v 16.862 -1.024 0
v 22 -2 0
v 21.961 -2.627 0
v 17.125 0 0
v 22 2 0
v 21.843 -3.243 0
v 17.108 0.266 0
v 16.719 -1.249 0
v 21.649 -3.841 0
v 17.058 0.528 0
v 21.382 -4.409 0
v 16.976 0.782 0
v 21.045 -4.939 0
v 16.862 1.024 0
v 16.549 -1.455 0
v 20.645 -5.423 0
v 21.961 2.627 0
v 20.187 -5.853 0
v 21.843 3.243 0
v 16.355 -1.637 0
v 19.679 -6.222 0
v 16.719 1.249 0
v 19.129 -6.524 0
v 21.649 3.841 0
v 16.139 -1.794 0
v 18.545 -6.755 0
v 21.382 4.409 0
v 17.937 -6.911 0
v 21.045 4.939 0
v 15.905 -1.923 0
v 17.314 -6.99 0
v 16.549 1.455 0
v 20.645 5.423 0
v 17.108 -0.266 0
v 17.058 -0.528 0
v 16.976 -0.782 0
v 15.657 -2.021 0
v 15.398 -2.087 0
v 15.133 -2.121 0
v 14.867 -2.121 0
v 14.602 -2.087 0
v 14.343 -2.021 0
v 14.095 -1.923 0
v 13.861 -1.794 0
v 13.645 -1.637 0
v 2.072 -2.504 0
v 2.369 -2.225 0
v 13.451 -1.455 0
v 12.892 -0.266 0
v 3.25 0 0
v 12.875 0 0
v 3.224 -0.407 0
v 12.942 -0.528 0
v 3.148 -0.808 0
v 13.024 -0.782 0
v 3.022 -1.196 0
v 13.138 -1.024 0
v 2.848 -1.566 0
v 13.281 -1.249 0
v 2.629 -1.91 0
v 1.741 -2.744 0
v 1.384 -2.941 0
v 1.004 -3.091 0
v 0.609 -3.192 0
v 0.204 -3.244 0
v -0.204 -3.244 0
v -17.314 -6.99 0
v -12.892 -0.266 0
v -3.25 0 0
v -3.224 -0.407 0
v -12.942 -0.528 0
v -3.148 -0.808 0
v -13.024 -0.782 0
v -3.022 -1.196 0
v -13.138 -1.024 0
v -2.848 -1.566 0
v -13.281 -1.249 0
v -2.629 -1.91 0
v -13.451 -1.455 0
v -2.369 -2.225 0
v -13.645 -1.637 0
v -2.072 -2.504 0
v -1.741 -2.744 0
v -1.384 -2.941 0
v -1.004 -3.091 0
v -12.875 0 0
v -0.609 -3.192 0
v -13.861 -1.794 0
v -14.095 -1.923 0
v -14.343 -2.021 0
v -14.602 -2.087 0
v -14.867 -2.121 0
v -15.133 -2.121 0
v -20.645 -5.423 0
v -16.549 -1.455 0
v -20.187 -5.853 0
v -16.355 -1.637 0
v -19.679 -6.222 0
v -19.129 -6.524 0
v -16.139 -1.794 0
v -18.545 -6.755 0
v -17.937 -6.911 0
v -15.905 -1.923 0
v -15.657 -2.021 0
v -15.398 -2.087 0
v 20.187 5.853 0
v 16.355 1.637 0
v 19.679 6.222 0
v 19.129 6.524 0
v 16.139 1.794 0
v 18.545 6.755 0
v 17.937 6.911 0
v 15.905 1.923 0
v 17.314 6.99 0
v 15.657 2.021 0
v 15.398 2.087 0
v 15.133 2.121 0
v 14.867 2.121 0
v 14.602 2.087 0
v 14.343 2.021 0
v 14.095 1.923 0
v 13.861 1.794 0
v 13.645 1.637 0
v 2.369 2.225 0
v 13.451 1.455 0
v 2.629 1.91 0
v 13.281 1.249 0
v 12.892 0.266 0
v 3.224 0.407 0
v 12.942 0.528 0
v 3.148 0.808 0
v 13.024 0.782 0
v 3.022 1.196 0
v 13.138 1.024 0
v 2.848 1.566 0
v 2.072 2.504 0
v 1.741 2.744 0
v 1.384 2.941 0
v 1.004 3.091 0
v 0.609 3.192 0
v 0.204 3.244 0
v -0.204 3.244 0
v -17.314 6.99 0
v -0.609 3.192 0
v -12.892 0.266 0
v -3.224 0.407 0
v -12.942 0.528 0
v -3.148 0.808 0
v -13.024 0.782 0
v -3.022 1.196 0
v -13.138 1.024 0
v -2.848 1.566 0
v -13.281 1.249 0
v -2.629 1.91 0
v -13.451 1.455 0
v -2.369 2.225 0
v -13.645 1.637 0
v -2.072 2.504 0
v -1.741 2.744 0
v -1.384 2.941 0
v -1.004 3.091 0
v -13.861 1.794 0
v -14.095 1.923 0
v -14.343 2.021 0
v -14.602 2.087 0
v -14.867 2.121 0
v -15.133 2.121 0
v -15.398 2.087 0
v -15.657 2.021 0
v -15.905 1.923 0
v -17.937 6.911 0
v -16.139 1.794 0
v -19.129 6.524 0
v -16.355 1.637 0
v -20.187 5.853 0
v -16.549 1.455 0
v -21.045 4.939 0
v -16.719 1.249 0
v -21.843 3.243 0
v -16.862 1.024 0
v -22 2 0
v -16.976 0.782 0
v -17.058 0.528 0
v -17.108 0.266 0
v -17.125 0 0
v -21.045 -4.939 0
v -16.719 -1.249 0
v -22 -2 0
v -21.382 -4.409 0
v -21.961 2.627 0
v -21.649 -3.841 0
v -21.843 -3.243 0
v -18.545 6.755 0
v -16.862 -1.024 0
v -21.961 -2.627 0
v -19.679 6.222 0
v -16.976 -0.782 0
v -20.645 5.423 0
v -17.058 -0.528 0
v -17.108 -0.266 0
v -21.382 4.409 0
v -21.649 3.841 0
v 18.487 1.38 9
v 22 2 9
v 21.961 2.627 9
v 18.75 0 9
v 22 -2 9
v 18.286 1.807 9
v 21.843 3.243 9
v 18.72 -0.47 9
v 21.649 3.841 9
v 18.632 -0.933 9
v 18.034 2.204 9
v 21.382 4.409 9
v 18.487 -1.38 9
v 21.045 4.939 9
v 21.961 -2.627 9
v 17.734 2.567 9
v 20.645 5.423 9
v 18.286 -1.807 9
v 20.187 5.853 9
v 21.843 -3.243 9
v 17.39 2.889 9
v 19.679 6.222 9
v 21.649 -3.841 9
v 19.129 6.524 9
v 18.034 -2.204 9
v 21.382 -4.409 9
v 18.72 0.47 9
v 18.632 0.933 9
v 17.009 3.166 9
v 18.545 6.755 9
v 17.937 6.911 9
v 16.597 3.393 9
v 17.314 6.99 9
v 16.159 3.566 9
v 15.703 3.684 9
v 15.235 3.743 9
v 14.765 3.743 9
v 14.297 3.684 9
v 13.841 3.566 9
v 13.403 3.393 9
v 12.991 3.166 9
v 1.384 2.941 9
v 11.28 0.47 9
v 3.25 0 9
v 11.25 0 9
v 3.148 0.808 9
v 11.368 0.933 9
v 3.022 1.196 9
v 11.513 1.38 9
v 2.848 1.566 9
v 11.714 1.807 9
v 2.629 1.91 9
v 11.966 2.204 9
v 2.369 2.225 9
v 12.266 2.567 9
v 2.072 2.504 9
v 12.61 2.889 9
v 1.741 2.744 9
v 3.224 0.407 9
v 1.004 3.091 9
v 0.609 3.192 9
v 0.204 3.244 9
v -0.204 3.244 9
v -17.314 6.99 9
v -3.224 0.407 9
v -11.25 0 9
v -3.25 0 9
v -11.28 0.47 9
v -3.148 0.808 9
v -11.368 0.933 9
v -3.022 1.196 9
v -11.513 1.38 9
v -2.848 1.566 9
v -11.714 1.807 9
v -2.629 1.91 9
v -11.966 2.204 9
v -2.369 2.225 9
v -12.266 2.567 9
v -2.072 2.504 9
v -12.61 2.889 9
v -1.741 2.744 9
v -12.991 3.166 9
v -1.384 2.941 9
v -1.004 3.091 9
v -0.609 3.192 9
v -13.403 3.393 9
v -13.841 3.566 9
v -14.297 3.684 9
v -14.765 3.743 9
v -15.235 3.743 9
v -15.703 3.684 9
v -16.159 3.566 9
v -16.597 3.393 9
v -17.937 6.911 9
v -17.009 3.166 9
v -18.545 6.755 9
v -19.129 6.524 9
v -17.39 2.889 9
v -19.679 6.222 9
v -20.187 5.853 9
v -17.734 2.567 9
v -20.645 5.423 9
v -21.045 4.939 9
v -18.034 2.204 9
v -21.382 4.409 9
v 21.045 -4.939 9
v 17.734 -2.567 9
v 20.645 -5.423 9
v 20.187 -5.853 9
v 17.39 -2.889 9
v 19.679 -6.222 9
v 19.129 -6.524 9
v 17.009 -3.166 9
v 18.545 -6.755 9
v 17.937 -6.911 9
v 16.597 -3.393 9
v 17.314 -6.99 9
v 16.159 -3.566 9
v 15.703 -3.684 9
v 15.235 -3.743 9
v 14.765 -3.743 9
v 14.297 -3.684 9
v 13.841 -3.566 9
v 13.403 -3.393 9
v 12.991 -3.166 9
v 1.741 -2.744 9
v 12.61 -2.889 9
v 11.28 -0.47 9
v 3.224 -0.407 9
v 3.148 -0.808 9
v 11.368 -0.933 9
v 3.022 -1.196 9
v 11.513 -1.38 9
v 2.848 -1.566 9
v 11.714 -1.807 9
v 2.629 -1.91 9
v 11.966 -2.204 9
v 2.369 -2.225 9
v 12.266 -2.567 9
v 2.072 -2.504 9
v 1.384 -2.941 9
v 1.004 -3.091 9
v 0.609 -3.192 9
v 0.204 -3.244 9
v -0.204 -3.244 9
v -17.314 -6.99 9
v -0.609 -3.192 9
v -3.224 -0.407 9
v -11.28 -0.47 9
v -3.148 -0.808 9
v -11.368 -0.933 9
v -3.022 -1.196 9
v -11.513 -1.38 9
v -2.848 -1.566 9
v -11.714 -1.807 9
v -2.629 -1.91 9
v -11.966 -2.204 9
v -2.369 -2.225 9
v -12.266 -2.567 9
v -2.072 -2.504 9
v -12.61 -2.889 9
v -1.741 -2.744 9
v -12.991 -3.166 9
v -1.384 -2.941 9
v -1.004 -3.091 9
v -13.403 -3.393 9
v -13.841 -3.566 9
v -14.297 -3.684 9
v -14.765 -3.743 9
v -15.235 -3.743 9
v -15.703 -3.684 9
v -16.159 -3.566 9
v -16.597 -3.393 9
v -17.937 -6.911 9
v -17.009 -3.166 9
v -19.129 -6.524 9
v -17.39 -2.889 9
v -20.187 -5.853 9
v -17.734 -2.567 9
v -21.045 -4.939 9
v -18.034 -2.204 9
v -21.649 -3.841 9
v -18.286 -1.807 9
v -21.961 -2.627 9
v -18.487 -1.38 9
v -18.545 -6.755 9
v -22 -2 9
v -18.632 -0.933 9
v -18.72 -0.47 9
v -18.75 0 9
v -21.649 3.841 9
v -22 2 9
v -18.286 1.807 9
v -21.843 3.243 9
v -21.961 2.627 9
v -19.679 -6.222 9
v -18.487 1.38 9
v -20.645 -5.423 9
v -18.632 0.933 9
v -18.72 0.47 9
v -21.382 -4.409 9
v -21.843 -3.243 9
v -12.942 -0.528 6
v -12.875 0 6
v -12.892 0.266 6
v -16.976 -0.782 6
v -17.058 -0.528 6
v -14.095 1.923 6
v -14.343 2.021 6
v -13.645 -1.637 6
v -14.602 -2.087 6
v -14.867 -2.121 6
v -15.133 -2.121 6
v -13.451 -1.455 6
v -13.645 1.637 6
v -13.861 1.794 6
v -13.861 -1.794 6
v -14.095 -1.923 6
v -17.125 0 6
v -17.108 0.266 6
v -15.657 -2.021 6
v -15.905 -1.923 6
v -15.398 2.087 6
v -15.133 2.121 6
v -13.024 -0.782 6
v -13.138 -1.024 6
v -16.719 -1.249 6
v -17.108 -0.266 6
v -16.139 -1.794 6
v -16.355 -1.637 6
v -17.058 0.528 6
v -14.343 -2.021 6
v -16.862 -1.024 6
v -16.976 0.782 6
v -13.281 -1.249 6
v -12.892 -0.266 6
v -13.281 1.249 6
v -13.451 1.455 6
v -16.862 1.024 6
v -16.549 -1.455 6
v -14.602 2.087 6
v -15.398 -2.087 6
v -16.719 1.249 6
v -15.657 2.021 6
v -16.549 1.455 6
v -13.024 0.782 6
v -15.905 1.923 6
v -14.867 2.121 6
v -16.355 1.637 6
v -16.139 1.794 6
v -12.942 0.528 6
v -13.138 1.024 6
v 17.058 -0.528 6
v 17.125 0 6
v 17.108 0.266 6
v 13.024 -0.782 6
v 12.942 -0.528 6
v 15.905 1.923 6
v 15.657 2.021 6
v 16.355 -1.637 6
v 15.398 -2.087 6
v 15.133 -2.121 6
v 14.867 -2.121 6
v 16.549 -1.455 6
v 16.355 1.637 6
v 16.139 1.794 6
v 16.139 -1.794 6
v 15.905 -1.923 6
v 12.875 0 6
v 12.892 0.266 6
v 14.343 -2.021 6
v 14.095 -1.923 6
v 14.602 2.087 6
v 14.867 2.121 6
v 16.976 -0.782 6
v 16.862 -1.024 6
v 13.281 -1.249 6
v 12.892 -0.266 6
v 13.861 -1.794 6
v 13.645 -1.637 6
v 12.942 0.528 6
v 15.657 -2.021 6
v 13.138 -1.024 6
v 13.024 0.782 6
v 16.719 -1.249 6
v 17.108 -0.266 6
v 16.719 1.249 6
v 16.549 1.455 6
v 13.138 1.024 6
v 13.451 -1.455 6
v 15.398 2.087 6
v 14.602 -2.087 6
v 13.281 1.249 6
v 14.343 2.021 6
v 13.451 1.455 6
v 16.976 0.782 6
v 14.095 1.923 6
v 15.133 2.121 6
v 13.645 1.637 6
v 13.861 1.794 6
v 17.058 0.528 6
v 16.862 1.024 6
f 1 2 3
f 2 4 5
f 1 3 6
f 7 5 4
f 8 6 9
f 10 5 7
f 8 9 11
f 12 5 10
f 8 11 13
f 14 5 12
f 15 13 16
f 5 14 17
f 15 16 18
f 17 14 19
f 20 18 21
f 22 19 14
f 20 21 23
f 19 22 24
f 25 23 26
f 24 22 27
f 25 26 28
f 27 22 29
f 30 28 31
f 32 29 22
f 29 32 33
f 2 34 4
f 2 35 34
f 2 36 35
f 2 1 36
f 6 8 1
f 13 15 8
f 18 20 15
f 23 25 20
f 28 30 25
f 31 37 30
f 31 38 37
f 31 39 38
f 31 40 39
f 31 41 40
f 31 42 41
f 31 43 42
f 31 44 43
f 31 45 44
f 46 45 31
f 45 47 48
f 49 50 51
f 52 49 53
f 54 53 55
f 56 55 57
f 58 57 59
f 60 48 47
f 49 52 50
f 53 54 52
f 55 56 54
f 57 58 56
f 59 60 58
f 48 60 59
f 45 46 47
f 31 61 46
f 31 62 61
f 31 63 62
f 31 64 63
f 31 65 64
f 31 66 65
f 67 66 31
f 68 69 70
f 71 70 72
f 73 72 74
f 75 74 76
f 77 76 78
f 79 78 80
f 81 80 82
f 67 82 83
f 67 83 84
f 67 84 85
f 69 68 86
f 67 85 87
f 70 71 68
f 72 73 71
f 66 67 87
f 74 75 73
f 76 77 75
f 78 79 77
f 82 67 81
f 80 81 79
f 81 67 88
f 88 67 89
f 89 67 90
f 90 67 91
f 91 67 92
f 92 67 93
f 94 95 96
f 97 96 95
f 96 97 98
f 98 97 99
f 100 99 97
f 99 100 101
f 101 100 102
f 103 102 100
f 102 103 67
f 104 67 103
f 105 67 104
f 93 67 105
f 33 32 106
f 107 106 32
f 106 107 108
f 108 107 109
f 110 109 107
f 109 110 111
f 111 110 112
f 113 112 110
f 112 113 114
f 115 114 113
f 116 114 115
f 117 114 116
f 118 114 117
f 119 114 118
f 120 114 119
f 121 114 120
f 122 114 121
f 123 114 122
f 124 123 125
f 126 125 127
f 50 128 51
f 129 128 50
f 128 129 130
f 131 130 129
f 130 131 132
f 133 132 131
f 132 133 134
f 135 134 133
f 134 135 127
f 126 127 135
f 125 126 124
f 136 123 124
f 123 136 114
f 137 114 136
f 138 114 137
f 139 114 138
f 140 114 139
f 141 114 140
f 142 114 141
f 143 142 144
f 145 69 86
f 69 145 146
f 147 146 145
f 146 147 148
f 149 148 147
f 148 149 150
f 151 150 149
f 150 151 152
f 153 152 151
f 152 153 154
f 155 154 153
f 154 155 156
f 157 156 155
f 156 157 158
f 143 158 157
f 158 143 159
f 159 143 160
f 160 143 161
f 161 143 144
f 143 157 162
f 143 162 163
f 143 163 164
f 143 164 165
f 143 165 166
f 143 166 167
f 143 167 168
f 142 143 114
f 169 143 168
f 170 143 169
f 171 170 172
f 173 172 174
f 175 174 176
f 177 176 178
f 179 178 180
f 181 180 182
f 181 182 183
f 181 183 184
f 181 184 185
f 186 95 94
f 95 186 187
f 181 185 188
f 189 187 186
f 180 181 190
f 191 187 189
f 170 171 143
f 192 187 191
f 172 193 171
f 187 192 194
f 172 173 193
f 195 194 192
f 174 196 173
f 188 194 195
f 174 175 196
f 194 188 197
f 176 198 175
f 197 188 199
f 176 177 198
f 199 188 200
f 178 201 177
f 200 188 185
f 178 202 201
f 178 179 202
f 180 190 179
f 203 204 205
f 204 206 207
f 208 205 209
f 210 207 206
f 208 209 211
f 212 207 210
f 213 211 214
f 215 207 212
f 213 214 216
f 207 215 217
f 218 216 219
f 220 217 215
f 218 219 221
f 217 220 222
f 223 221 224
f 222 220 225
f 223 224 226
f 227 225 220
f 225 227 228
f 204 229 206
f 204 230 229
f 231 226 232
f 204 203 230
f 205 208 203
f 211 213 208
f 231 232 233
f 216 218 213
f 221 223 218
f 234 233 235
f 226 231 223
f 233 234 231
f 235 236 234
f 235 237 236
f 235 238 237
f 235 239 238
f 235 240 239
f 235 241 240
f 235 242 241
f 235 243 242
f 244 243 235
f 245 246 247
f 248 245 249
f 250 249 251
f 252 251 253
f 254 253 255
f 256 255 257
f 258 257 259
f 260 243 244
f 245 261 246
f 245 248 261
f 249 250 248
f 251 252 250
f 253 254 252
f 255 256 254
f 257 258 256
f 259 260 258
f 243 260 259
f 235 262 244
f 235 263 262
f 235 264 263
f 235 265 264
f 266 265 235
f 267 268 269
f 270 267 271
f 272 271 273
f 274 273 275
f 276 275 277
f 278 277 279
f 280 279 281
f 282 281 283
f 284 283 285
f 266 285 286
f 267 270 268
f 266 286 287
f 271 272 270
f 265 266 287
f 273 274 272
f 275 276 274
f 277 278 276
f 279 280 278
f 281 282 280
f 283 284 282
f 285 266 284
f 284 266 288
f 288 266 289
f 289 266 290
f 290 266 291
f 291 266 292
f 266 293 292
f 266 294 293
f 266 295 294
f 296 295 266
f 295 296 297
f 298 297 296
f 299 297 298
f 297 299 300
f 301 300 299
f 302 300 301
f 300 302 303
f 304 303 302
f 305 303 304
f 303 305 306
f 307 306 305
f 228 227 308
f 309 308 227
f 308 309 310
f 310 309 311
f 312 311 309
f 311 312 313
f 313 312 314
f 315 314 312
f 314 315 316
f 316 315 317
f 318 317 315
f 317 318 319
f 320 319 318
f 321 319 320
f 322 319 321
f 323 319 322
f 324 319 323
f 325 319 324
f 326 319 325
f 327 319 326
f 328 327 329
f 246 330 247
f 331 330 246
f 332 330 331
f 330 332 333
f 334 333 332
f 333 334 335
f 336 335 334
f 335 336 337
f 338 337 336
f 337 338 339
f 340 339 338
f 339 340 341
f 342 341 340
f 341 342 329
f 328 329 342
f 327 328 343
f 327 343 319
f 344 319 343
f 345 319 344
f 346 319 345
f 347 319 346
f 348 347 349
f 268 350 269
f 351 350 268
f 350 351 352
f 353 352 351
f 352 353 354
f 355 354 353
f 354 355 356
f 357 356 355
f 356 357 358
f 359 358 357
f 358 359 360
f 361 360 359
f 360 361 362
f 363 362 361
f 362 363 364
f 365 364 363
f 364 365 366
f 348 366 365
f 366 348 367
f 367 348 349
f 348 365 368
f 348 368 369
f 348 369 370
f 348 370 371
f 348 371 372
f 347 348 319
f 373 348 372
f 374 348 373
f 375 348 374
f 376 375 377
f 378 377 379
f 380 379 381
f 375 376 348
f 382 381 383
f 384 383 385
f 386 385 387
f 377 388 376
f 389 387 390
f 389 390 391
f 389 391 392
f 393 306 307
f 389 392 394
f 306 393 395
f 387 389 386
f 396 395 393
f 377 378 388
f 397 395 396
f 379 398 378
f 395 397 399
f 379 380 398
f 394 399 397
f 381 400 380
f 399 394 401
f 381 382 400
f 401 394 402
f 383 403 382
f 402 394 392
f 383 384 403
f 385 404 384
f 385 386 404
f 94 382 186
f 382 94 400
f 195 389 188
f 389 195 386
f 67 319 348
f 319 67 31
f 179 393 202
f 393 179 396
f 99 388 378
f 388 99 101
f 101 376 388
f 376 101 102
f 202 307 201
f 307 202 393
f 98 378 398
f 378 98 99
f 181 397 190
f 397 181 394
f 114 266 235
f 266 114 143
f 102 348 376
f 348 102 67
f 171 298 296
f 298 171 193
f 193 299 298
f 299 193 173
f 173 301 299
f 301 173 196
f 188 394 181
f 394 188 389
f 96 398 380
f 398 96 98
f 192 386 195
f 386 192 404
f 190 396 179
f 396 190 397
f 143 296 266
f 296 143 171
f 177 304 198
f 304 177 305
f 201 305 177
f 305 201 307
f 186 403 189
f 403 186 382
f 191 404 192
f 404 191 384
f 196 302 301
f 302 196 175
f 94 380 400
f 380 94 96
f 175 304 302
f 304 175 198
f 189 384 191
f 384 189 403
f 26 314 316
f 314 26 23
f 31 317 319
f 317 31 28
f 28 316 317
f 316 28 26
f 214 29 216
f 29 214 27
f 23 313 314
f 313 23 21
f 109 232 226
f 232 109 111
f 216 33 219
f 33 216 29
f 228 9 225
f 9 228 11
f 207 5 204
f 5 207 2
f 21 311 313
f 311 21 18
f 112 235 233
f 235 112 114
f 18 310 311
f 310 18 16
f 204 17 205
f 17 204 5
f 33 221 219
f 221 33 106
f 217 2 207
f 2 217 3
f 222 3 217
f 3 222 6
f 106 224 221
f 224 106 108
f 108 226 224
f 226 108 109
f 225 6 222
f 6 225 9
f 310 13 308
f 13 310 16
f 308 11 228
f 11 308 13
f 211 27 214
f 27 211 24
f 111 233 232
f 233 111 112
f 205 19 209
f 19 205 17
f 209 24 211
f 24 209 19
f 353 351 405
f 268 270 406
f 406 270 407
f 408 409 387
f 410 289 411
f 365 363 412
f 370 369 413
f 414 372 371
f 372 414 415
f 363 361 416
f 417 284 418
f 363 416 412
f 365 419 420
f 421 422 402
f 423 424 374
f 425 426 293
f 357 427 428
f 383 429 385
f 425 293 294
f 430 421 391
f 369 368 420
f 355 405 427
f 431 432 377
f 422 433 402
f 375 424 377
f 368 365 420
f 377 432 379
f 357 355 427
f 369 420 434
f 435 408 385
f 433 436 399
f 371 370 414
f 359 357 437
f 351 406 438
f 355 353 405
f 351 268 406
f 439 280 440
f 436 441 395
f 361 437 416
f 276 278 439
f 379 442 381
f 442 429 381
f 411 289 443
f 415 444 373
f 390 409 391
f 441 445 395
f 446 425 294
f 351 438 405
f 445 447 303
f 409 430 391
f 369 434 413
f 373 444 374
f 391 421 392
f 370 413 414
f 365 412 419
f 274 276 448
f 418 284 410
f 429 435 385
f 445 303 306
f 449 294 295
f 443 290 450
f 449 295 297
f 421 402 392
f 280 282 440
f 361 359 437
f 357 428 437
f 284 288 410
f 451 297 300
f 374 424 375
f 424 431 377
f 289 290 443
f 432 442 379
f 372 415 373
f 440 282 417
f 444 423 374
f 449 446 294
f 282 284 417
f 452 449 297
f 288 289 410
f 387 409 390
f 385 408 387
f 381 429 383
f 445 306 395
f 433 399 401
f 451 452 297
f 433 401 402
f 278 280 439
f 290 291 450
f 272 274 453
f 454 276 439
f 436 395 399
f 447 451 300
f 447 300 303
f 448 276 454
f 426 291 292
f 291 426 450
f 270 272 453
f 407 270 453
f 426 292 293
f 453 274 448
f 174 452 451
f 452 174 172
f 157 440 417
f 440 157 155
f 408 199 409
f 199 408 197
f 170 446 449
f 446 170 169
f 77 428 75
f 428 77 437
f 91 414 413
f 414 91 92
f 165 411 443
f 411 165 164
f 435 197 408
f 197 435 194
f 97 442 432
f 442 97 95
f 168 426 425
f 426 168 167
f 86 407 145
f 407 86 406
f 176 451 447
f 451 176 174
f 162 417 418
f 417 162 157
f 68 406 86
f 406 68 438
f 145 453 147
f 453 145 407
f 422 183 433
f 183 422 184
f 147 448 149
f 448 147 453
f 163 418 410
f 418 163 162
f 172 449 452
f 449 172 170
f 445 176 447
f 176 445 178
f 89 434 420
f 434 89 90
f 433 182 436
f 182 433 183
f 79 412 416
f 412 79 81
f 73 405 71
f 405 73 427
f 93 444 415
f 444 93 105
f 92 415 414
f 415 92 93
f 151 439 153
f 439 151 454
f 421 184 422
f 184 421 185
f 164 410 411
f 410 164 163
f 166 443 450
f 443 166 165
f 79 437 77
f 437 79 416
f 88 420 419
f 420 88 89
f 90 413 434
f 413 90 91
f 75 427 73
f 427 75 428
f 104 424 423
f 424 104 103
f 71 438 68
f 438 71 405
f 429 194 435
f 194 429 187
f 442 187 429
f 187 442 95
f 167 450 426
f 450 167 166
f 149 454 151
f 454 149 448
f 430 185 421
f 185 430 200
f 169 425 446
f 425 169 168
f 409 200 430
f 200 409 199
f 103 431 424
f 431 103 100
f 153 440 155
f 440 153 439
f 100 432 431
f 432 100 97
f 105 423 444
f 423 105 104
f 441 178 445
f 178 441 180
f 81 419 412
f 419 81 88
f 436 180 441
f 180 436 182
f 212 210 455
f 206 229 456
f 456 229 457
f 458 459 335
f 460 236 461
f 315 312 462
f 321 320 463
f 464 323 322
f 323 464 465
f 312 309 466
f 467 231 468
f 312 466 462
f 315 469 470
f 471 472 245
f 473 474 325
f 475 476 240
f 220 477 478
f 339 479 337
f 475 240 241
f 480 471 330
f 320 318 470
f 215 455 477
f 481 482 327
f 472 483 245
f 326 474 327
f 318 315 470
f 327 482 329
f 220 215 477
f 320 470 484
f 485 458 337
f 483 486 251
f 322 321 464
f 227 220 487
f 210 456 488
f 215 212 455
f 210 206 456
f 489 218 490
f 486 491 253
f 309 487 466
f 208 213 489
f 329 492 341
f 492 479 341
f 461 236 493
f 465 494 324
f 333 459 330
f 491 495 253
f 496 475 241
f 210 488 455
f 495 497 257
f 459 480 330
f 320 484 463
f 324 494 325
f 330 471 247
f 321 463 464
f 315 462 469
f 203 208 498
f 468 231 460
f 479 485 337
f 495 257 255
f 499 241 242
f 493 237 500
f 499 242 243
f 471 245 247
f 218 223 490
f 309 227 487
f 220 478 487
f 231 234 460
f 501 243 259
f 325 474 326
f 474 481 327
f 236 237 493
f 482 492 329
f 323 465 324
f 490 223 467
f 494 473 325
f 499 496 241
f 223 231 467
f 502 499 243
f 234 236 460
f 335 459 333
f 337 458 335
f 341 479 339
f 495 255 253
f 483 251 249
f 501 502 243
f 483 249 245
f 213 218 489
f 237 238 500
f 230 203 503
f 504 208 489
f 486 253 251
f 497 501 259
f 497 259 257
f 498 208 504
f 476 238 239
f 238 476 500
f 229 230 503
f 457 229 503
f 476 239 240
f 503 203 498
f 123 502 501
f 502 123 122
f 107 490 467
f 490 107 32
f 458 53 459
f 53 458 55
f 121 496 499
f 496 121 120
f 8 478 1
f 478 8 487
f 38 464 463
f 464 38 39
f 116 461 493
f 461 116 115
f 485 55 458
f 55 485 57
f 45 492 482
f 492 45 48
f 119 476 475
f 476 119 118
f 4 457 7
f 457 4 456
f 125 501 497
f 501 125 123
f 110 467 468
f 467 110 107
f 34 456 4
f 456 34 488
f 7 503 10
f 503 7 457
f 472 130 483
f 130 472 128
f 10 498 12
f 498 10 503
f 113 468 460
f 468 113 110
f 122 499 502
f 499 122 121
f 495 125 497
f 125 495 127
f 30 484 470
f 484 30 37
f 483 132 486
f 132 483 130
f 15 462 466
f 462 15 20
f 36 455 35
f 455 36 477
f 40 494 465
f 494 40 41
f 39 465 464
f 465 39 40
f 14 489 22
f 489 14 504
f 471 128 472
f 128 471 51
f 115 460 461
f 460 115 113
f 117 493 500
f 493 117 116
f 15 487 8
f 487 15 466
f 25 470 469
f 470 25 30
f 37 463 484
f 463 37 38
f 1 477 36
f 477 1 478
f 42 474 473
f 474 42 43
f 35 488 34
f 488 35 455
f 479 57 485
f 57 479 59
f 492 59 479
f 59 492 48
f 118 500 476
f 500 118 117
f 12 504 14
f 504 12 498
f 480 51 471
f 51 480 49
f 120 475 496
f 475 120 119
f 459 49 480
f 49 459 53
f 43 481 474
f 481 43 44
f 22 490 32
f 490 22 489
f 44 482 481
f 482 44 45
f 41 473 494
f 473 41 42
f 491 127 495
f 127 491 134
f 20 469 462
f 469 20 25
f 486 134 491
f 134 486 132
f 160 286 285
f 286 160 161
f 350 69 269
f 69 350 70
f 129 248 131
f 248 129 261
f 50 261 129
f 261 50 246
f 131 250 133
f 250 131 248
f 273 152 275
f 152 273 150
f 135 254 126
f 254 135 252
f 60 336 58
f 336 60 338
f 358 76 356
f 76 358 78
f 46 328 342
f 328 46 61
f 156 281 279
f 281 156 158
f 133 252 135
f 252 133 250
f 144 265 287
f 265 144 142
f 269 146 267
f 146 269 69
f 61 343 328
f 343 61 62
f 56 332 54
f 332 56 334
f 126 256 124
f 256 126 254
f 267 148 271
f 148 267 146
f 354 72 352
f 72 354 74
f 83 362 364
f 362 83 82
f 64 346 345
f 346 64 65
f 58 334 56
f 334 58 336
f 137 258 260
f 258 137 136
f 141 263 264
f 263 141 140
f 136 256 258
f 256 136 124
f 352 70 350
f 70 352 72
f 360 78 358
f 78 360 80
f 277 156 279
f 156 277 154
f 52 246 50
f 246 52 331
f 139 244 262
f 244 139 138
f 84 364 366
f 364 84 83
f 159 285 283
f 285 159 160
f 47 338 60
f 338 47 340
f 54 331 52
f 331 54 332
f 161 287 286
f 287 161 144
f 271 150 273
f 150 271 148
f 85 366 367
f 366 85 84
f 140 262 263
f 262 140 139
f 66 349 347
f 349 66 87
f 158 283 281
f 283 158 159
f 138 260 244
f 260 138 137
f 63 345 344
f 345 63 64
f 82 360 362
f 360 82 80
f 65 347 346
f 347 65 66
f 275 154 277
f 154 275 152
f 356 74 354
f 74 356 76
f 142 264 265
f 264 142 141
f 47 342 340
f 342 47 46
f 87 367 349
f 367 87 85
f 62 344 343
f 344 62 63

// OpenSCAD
$fn = 50;


difference() {
	union() {
		cylinder(h = 9, r = 7.0000000000);
		translate(v = [-7.5000000000, 0.0000000000, 0]) {
			hull() {
				translate(v = [-9.5000000000, 2.0000000000, 0]) {
					cylinder(h = 9, r = 5);
				}
				translate(v = [9.5000000000, 2.0000000000, 0]) {
					cylinder(h = 9, r = 5);
				}
				translate(v = [-9.5000000000, -2.0000000000, 0]) {
					cylinder(h = 9, r = 5);
				}
				translate(v = [9.5000000000, -2.0000000000, 0]) {
					cylinder(h = 9, r = 5);
				}
			}
		}
		translate(v = [-7.5000000000, 0.0000000000, 0]) {
			hull() {
				translate(v = [-9.5000000000, 2.0000000000, 0]) {
					cylinder(h = 9, r = 5);
				}
				translate(v = [9.5000000000, 2.0000000000, 0]) {
					cylinder(h = 9, r = 5);
				}
				translate(v = [-9.5000000000, -2.0000000000, 0]) {
					cylinder(h = 9, r = 5);
				}
				translate(v = [9.5000000000, -2.0000000000, 0]) {
					cylinder(h = 9, r = 5);
				}
			}
		}
		translate(v = [7.5000000000, 0.0000000000, 0]) {
			hull() {
				translate(v = [-9.5000000000, 2.0000000000, 0]) {
					cylinder(h = 9, r = 5);
				}
				translate(v = [9.5000000000, 2.0000000000, 0]) {
					cylinder(h = 9, r = 5);
				}
				translate(v = [-9.5000000000, -2.0000000000, 0]) {
					cylinder(h = 9, r = 5);
				}
				translate(v = [9.5000000000, -2.0000000000, 0]) {
					cylinder(h = 9, r = 5);
				}
			}
		}
		translate(v = [7.5000000000, 0.0000000000, 0]) {
			hull() {
				translate(v = [-9.5000000000, 2.0000000000, 0]) {
					cylinder(h = 9, r = 5);
				}
				translate(v = [9.5000000000, 2.0000000000, 0]) {
					cylinder(h = 9, r = 5);
				}
				translate(v = [-9.5000000000, -2.0000000000, 0]) {
					cylinder(h = 9, r = 5);
				}
				translate(v = [9.5000000000, -2.0000000000, 0]) {
					cylinder(h = 9, r = 5);
				}
			}
		}
	}
	union() {
		translate(v = [-15.0000000000, 0.0000000000, 9]) {
			rotate(a = [0, 0, 0]) {
				difference() {
					union() {
						#translate(v = [0, 0, -9.0000000000]) {
							cylinder(h = 9, r = 2.0000000000);
						}
						#translate(v = [0, 0, -3]) {
							cylinder(h = 3, r1 = 2.1250000000, r2 = 3.7500000000);
						}
						#translate(v = [0, 0, -9.0000000000]) {
							cylinder(h = 9, r = 2.1250000000);
						}
						#translate(v = [0, 0, -9.0000000000]) {
							cylinder(h = 9, r = 2.0000000000);
						}
					}
					union();
				}
			}
		}
		translate(v = [-15.0000000000, 0.0000000000, 9]) {
			rotate(a = [0, 0, 0]) {
				difference() {
					union() {
						#translate(v = [0, 0, -9.0000000000]) {
							cylinder(h = 9, r = 2.0000000000);
						}
						#translate(v = [0, 0, -3]) {
							cylinder(h = 3, r1 = 2.1250000000, r2 = 3.7500000000);
						}
						#translate(v = [0, 0, -9.0000000000]) {
							cylinder(h = 9, r = 2.1250000000);
						}
						#translate(v = [0, 0, -9.0000000000]) {
							cylinder(h = 9, r = 2.0000000000);
						}
					}
					union();
				}
			}
		}
		translate(v = [15.0000000000, 0.0000000000, 9]) {
			rotate(a = [0, 0, 0]) {
				difference() {
					union() {
						#translate(v = [0, 0, -9.0000000000]) {
							cylinder(h = 9, r = 2.0000000000);
						}
						#translate(v = [0, 0, -3]) {
							cylinder(h = 3, r1 = 2.1250000000, r2 = 3.7500000000);
						}
						#translate(v = [0, 0, -9.0000000000]) {
							cylinder(h = 9, r = 2.1250000000);
						}
						#translate(v = [0, 0, -9.0000000000]) {
							cylinder(h = 9, r = 2.0000000000);
						}
					}
					union();
				}
			}
		}
		translate(v = [15.0000000000, 0.0000000000, 9]) {
			rotate(a = [0, 0, 0]) {
				difference() {
					union() {
						#translate(v = [0, 0, -9.0000000000]) {
							cylinder(h = 9, r = 2.0000000000);
						}
						#translate(v = [0, 0, -3]) {
							cylinder(h = 3, r1 = 2.1250000000, r2 = 3.7500000000);
						}
						#translate(v = [0, 0, -9.0000000000]) {
							cylinder(h = 9, r = 2.1250000000);
						}
						#translate(v = [0, 0, -9.0000000000]) {
							cylinder(h = 9, r = 2.0000000000);
						}
					}
					union();
				}
			}
		}
		translate(v = [0, 0, -100]) {
			cylinder(h = 200, r = 3.2500000000);
		}
		translate(v = [0, 0, -100]) {
			cylinder(h = 200, r = 1.8000000000);
		}
	}
}
